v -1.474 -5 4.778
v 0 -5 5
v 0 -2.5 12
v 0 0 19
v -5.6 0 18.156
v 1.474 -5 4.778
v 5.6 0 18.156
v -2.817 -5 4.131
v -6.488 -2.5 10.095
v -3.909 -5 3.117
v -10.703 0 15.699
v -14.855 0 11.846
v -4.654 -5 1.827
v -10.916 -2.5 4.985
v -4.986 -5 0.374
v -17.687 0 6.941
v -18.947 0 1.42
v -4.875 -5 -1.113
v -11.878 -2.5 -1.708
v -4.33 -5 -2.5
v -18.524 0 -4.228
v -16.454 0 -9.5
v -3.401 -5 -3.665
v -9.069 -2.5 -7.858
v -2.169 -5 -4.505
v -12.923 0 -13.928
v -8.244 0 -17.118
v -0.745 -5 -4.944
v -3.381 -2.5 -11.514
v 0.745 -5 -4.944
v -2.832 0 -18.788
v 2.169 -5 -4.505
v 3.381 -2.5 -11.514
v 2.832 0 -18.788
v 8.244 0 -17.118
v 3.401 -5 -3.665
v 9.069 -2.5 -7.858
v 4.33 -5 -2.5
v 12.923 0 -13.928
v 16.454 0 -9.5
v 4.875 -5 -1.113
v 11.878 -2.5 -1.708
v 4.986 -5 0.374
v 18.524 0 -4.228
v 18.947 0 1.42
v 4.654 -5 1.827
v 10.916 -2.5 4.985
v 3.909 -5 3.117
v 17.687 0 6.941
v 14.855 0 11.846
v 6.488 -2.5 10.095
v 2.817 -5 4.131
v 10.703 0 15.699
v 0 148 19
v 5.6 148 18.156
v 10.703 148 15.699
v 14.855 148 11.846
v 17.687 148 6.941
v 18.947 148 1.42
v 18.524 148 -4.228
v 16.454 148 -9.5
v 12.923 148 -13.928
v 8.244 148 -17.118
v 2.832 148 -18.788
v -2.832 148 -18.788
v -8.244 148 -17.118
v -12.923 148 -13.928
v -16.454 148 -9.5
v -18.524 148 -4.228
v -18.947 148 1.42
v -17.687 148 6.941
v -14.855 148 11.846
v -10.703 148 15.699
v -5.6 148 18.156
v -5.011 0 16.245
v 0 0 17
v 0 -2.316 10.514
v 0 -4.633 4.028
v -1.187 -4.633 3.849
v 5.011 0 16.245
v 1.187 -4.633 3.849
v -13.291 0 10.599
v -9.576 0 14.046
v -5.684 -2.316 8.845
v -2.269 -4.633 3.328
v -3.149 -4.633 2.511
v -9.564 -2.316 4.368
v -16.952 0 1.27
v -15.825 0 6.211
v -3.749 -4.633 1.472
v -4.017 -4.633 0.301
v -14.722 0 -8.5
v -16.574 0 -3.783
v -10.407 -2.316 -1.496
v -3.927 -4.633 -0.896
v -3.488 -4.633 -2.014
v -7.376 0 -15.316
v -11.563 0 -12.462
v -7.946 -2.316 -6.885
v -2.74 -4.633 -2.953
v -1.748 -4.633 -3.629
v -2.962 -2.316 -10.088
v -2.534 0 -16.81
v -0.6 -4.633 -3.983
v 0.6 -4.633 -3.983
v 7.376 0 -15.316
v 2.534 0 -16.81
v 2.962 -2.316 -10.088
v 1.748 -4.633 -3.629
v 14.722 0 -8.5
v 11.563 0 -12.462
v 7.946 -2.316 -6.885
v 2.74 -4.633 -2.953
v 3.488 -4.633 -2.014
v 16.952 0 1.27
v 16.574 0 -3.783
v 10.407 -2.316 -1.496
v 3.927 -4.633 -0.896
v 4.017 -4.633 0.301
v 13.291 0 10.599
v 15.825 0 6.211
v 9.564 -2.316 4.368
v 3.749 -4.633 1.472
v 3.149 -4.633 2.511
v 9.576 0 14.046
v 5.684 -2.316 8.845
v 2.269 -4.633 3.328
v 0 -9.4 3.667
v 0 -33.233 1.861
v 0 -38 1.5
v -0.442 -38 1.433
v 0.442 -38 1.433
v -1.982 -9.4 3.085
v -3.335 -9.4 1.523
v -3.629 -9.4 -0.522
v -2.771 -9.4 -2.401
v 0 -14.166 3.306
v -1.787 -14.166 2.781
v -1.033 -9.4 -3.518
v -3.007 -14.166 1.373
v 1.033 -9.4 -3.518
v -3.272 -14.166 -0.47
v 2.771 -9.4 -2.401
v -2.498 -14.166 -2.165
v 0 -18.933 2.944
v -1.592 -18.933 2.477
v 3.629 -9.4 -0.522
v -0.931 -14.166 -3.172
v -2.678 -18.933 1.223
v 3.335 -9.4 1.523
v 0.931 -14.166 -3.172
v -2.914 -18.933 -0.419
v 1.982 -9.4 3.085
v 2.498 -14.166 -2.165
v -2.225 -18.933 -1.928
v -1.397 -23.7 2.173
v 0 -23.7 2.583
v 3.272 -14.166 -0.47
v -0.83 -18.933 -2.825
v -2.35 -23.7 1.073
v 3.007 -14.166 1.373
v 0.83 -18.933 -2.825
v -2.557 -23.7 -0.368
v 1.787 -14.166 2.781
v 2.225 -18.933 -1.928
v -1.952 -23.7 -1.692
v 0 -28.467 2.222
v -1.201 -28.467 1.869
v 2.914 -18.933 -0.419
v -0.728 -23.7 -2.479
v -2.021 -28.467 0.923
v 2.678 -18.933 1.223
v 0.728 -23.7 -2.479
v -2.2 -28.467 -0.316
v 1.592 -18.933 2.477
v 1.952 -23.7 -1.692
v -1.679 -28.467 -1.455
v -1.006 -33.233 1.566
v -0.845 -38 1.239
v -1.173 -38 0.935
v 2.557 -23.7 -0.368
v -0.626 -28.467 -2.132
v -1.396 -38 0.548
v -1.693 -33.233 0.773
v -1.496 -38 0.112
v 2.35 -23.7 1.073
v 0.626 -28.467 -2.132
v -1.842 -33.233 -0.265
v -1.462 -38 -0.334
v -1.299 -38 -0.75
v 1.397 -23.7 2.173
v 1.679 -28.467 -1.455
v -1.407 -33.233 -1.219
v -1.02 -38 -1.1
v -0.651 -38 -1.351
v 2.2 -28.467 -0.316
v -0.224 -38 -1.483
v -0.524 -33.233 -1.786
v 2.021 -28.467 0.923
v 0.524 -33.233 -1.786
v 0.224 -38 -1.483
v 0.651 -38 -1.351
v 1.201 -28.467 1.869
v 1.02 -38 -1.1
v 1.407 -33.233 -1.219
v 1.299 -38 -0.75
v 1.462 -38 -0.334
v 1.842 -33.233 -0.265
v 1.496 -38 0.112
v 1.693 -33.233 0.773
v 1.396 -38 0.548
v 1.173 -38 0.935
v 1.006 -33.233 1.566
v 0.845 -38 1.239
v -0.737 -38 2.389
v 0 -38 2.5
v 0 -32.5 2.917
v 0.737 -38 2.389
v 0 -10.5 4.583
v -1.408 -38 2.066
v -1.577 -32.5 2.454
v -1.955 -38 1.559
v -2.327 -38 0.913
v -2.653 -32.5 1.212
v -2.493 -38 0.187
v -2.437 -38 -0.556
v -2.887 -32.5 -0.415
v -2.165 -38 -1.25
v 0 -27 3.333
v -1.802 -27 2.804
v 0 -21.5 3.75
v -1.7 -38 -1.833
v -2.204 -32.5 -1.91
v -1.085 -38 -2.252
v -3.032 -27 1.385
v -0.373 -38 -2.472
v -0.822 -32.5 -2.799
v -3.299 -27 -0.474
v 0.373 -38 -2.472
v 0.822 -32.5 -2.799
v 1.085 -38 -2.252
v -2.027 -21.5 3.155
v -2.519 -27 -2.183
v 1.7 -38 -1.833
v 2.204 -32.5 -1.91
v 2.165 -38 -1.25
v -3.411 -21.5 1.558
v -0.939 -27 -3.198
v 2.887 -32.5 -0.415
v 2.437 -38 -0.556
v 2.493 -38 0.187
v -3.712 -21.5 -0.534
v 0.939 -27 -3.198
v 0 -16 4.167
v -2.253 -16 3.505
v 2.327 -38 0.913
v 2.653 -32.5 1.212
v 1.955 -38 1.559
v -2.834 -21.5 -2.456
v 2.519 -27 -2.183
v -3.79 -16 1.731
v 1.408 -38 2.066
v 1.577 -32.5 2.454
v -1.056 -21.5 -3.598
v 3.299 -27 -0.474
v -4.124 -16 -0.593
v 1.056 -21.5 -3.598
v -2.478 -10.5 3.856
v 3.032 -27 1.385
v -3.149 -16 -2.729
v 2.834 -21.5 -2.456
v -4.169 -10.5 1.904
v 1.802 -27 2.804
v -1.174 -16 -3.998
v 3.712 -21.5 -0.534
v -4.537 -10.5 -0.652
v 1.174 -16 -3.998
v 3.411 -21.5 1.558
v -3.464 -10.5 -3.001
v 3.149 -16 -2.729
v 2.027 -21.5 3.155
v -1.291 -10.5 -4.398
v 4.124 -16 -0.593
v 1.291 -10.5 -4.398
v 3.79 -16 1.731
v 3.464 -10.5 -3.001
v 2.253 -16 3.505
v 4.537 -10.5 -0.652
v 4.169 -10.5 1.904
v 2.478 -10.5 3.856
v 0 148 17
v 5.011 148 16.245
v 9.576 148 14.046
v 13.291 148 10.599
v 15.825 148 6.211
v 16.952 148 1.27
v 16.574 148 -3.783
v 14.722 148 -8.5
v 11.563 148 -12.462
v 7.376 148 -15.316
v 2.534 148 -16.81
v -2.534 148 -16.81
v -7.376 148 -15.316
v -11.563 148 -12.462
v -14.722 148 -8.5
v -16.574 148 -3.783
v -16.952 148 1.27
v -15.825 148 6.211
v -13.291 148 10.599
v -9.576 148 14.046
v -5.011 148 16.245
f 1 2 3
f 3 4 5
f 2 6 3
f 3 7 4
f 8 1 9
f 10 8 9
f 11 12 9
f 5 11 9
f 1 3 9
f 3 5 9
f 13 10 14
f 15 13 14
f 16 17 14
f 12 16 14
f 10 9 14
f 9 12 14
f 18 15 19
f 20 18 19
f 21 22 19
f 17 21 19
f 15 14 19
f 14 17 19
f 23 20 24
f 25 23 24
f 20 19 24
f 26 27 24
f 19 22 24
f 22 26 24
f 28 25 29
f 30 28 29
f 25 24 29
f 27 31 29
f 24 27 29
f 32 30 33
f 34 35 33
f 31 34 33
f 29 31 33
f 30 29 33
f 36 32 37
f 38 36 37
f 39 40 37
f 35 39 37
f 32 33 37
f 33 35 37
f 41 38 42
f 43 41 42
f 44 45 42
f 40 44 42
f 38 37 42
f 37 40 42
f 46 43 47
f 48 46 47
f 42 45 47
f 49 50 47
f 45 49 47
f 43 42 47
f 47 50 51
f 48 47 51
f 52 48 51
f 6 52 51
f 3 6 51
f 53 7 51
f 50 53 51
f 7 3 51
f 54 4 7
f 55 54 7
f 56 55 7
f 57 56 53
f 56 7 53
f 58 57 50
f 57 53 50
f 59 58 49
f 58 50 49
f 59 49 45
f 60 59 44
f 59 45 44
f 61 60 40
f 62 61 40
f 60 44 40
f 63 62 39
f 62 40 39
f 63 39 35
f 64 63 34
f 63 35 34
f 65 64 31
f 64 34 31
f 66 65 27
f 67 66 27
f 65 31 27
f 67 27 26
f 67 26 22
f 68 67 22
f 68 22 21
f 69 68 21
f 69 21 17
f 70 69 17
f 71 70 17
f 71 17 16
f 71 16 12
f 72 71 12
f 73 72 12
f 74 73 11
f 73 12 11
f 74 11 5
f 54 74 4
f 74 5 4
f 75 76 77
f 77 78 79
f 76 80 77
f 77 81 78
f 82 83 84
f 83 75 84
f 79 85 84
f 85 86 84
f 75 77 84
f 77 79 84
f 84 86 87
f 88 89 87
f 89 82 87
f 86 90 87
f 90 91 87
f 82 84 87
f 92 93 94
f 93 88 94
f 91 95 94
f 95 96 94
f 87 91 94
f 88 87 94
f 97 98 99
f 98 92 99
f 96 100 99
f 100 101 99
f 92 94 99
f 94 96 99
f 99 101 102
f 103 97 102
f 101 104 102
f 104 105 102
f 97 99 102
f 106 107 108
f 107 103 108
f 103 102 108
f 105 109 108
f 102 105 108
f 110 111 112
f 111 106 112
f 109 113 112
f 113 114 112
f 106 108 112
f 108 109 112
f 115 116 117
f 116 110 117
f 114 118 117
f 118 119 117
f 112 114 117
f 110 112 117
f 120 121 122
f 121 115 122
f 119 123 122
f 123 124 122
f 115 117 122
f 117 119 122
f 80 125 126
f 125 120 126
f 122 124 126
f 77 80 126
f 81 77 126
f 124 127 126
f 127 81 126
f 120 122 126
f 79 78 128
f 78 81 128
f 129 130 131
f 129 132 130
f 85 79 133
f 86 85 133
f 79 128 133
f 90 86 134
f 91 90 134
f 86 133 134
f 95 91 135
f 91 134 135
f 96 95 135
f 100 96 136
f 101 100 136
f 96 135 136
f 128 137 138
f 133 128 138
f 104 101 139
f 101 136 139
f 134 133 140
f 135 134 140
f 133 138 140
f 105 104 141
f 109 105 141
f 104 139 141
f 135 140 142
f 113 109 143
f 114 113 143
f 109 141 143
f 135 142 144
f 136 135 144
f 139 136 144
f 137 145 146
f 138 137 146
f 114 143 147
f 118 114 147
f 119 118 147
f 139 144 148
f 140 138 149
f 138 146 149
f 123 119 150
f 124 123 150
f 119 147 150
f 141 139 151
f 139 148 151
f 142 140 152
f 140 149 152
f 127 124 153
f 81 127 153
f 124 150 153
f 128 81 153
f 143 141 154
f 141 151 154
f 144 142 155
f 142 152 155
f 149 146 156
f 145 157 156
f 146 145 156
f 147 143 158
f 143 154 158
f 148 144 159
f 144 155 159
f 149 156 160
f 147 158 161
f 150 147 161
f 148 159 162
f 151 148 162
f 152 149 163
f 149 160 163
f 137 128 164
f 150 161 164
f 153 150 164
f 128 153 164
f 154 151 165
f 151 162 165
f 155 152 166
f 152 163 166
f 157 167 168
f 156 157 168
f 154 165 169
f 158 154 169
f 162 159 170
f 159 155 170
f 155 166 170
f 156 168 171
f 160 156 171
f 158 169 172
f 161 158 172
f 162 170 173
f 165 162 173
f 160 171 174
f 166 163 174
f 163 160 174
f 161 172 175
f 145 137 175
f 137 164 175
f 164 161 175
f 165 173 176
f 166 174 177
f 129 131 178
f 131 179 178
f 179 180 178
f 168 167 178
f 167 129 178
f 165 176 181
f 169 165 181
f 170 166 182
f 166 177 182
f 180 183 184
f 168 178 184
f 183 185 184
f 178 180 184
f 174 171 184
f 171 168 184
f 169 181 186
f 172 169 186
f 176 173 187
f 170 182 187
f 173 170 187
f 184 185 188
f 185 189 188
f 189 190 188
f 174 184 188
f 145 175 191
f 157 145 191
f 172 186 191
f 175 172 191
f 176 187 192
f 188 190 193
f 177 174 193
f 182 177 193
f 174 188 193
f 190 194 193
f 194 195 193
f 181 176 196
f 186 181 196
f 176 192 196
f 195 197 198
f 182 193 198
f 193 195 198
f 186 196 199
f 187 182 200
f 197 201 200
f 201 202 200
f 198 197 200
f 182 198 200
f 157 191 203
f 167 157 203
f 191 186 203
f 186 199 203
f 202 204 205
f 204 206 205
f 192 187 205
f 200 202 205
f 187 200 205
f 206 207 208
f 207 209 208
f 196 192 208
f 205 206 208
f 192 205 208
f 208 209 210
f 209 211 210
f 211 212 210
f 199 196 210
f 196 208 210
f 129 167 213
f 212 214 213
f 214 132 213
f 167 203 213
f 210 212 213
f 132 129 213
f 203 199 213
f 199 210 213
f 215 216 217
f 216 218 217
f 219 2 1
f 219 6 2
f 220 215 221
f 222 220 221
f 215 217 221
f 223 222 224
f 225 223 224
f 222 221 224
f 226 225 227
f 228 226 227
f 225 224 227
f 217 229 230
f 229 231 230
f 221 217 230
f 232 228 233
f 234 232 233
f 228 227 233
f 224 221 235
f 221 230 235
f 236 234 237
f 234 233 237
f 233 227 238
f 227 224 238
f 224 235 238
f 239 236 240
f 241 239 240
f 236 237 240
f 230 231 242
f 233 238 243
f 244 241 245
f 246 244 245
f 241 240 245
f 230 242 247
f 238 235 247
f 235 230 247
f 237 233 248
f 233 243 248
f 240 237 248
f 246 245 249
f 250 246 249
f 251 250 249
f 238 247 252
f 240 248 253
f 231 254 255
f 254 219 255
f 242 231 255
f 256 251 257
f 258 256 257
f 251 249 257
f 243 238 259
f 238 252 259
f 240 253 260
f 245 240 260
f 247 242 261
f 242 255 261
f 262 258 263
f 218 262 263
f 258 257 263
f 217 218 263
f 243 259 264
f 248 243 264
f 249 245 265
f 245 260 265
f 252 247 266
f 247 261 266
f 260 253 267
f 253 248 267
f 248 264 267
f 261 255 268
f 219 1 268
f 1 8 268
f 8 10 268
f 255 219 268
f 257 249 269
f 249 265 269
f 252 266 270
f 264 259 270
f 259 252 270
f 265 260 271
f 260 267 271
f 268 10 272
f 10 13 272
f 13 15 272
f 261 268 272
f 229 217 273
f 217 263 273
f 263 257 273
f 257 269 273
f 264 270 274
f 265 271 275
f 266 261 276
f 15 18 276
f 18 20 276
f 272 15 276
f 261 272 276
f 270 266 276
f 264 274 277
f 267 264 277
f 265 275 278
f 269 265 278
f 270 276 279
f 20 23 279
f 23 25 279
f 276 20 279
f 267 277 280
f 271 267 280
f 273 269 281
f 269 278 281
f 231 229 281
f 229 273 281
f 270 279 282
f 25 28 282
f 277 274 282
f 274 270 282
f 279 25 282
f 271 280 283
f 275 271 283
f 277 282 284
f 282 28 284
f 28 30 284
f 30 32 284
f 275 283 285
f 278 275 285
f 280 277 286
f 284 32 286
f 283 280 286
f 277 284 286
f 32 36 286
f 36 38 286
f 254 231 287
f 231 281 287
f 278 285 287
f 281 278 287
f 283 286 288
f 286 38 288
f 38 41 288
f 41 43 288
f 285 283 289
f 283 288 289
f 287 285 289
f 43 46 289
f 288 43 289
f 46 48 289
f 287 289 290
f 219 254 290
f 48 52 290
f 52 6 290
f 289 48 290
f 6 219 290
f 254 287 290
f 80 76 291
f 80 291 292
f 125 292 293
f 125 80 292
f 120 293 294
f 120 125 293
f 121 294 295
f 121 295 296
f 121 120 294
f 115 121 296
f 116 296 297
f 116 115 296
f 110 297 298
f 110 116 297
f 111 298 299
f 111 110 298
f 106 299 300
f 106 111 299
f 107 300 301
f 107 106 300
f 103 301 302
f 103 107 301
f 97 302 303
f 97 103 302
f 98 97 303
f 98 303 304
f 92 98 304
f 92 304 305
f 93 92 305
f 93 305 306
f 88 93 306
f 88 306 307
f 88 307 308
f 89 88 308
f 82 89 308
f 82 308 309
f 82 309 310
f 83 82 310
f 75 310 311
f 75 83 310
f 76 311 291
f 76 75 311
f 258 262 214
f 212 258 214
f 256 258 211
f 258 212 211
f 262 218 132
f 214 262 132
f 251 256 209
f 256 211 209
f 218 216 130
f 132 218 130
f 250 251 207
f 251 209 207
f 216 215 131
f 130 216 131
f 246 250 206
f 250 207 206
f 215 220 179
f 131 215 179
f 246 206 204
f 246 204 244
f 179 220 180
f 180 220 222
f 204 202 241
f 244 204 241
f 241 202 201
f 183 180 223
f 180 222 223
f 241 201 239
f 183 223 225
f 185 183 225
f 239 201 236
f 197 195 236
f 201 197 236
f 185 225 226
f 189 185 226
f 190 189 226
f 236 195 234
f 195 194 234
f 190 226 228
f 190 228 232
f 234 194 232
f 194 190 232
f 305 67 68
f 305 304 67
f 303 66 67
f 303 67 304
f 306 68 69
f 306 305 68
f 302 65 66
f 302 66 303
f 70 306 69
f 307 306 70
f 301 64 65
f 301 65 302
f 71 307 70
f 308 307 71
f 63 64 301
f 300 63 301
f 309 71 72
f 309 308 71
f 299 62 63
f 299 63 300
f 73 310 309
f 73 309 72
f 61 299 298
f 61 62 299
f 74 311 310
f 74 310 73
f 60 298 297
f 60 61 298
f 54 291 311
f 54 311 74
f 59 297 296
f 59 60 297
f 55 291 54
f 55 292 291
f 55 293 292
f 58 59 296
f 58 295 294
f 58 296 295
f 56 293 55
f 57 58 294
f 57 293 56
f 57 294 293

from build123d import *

# Parameters (mm, degrees)
SKETCH_1_R      = 19
SKETCH_1_R_2    = 17
EXTRUDE_1_DEPTH = 148


with BuildPart() as part:
    # 草图1 → 凸台-拉伸1 (new body)
    with BuildSketch(Plane(origin=(0, 0, 0), x_dir=(1, 0, 0), z_dir=(0, 1, 0))):
        with Locations(Location((0, 0, 0), (0, 0, 270))):
            Circle(SKETCH_1_R)
        with Locations(Location((0, 0, 0), (0, 0, 270))):
            Circle(SKETCH_1_R_2, mode=Mode.SUBTRACT)
    extrude(amount=EXTRUDE_1_DEPTH)

    # 草图6 → 旋转1 (revolve)
    with BuildSketch(Plane.XY, mode=Mode.PRIVATE) as revolve_1_sk:
        Polygon((-19, 0), (-17, 0), (-4.027808676, -4.632925473), (-1.5, -38), (-2.5, -38), (-5, -5), align=None)
    revolve(revolve_1_sk.sketch.rotate(Axis((0, 0, 0), (0, -1, 0)), 270), axis=Axis((0, 0, 0), (0, -1, 0)))


solid = part.part
